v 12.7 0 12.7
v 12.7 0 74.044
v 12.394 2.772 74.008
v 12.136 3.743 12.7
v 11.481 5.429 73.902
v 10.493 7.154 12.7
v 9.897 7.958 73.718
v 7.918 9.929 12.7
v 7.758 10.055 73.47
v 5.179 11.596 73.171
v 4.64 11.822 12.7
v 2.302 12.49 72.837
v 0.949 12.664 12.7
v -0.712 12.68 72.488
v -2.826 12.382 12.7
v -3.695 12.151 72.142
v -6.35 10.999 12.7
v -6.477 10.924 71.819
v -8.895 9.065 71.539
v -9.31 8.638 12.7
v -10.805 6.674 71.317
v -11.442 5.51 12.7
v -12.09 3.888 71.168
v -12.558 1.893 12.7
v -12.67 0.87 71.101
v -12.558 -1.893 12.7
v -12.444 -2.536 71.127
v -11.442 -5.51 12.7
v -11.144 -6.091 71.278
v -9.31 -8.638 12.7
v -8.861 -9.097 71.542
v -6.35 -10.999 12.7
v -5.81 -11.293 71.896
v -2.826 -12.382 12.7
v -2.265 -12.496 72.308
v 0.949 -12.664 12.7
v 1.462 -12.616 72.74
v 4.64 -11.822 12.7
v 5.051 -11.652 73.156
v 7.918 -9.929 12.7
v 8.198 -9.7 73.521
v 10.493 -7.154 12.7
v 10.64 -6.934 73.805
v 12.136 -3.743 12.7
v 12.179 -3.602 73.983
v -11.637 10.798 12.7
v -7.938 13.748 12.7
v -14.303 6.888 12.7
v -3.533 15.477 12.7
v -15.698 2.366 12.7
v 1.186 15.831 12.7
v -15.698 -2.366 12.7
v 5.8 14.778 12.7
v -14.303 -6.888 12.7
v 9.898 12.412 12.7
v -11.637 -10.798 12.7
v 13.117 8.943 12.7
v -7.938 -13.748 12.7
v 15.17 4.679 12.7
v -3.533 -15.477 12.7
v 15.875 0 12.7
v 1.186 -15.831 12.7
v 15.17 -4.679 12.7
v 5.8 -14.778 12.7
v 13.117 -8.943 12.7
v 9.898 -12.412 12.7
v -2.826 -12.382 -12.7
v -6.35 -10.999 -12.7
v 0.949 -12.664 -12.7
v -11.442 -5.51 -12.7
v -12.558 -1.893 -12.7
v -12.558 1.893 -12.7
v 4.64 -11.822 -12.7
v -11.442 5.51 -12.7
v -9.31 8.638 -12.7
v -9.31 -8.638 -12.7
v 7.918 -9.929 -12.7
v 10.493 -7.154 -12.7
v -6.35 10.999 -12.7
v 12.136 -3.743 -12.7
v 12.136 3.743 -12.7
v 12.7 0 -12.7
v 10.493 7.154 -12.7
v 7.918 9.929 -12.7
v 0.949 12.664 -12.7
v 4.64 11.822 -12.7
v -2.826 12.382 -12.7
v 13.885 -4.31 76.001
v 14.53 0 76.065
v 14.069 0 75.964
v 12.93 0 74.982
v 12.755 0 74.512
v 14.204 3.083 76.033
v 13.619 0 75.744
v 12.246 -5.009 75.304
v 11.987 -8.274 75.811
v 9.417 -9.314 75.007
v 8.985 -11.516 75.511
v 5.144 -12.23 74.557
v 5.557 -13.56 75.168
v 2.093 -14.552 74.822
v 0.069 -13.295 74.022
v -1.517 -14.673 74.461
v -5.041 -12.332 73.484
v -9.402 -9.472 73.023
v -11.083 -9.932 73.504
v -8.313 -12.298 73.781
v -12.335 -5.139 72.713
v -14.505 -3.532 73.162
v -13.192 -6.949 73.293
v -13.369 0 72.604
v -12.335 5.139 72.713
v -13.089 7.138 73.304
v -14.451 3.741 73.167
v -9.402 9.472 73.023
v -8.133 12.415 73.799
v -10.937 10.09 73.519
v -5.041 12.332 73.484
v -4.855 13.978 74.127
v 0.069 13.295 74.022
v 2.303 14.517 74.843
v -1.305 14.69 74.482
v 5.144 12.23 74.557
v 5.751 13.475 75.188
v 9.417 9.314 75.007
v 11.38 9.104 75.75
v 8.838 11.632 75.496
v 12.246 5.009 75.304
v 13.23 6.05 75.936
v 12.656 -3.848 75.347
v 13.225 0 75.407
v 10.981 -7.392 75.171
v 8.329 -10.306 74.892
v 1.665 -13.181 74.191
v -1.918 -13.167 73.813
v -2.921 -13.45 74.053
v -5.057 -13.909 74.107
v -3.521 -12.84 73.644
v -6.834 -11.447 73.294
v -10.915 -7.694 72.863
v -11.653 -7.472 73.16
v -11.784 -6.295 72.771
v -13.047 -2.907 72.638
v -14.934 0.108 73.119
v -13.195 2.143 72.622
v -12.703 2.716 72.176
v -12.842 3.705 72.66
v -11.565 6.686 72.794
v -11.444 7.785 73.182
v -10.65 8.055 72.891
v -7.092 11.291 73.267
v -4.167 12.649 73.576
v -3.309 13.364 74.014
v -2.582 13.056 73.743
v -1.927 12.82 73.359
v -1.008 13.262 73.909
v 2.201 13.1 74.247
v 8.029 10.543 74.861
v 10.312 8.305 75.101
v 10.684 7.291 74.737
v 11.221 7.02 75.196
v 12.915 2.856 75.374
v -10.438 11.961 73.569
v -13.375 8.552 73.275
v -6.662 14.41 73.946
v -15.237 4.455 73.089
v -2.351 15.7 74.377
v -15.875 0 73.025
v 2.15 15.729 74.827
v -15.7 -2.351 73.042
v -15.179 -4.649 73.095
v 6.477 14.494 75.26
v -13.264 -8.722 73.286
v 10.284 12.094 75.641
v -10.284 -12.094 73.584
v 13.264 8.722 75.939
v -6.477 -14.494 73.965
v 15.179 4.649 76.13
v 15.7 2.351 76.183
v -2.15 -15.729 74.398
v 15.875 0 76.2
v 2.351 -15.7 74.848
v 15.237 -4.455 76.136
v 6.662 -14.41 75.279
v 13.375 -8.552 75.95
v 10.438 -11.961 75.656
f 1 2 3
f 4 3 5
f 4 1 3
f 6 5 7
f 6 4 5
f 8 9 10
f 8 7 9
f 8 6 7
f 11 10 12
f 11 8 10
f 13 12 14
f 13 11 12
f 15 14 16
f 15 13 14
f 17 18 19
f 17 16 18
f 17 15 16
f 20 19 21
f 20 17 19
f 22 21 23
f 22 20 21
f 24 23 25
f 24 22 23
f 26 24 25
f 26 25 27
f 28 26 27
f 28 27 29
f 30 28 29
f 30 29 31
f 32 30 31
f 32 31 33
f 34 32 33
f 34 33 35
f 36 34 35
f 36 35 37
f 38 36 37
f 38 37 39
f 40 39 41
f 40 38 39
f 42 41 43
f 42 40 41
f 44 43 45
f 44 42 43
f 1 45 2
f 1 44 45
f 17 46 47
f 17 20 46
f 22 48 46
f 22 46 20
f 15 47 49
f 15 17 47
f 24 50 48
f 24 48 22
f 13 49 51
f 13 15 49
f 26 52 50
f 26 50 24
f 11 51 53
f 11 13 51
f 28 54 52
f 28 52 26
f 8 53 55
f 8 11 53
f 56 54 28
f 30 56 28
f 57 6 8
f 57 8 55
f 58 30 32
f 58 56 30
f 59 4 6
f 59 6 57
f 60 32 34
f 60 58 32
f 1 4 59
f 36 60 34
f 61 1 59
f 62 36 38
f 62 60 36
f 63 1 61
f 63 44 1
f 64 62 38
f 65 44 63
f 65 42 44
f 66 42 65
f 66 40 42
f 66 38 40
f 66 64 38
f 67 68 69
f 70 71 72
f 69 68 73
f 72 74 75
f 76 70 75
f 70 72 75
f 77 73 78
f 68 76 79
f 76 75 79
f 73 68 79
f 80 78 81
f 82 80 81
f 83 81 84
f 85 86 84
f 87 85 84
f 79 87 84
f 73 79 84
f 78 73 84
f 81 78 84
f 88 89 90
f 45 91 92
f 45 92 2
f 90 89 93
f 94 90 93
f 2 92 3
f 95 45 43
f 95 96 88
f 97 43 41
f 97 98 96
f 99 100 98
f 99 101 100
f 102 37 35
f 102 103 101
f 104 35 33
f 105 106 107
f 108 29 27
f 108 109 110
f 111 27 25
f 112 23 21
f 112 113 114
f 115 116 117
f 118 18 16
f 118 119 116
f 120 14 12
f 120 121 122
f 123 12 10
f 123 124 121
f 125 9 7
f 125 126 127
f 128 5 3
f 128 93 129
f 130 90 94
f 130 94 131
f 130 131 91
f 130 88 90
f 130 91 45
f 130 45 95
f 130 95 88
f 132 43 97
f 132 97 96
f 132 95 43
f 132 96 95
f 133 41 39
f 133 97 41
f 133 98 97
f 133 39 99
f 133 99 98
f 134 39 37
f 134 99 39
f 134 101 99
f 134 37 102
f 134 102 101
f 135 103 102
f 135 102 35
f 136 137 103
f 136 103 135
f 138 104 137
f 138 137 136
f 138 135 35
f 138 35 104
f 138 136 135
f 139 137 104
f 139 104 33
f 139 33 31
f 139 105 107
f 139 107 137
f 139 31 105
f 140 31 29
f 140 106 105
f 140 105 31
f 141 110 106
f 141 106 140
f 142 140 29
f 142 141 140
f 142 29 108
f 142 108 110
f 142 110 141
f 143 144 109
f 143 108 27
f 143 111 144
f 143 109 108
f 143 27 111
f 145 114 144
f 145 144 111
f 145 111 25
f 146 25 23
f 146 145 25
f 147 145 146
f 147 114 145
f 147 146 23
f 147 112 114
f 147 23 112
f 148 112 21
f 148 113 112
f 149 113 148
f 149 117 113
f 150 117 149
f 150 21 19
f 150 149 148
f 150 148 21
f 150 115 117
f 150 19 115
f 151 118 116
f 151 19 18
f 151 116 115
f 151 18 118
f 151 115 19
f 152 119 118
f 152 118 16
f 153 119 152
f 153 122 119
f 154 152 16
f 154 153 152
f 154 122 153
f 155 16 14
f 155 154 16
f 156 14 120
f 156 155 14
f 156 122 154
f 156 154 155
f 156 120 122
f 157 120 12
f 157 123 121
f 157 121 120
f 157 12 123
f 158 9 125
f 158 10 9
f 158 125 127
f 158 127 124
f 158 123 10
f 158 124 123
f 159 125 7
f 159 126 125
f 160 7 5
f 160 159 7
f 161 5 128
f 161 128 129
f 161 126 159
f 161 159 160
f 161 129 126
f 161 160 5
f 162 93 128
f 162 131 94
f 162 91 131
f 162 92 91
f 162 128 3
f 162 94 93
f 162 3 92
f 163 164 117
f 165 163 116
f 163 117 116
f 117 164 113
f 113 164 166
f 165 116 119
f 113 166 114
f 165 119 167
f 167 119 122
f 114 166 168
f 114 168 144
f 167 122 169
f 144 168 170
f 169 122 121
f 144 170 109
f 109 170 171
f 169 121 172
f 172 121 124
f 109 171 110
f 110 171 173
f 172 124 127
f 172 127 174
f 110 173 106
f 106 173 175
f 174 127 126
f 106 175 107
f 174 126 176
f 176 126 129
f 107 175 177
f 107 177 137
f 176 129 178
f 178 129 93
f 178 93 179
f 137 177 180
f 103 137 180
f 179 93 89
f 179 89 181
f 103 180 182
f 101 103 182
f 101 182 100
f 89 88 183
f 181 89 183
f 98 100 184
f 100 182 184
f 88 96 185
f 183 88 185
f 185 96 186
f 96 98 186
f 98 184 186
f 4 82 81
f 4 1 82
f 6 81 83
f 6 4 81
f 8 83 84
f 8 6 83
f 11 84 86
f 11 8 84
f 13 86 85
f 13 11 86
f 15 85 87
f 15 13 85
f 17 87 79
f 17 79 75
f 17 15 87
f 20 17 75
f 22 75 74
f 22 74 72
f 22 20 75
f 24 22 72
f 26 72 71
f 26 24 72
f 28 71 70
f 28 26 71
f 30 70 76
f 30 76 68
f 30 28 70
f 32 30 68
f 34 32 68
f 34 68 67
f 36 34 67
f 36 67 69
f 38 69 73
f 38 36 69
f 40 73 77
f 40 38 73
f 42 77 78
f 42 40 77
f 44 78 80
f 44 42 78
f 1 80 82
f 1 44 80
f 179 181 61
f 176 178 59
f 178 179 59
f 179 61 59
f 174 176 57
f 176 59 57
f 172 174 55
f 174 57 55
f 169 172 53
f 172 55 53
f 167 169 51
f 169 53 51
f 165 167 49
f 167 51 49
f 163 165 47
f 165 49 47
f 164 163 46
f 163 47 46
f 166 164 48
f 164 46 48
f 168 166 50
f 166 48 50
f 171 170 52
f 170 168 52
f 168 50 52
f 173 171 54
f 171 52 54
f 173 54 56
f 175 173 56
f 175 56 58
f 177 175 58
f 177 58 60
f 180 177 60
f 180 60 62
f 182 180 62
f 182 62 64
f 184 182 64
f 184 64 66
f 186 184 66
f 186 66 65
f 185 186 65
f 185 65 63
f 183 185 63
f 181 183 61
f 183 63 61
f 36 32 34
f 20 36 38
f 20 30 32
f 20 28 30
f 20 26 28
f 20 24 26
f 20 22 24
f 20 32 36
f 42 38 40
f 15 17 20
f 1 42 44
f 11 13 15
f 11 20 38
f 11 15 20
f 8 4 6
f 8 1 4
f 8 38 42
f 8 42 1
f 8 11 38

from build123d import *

# Parameters (mm, degrees)
F0_R      = 15.875
F0_R_2    = 12.7
F1_DEPTH  = 76.2
F2_DEPTH  = 3.175
F4_DEPTH  = 19.05
F5_R      = 2.032
F2_FACE_R = 15.875
F6_DEPTH  = 12.7
F7_DEPTH  = 12.7


with BuildPart() as f1:
    # F0 (on Top) → F1 (new body)
    with BuildSketch(Plane.XY):
        Circle(F0_R)
        Circle(F0_R_2, mode=Mode.SUBTRACT)
    extrude(amount=F1_DEPTH)

    # F0 (on Top) → F2 (join)
    with BuildSketch(Plane.XY):
        Circle(F0_R_2)
    extrude(amount=F2_DEPTH)

    # F3 (on Front) → F4 (cut, symmetric)
    with BuildSketch(Plane.XZ):
        Polygon((-15.875, 73.025), (15.875, 76.2), (-15.875, 76.2), align=None)
    extrude(amount=F4_DEPTH, both=True, mode=Mode.SUBTRACT)

    # F5
    f5_edges = [f1.edges().sort_by_distance(p)[0] for p in [
        (-12.7, 0, 73.3425),
    ]]
    fillet(f5_edges, radius=F5_R)

    # F2_face (on face) → F6 (cut)
    with BuildSketch(Plane(origin=(0, 0, 0), x_dir=(1, 0, 0), z_dir=(0, 0, -1))):
        Circle(F2_FACE_R)
    extrude(amount=-F6_DEPTH, mode=Mode.SUBTRACT)

    # F0 (on Top) → F7 (join, symmetric)
    with BuildSketch(Plane.XY):
        Circle(F0_R_2)
    extrude(amount=F7_DEPTH, both=True)


solid = f1.part
